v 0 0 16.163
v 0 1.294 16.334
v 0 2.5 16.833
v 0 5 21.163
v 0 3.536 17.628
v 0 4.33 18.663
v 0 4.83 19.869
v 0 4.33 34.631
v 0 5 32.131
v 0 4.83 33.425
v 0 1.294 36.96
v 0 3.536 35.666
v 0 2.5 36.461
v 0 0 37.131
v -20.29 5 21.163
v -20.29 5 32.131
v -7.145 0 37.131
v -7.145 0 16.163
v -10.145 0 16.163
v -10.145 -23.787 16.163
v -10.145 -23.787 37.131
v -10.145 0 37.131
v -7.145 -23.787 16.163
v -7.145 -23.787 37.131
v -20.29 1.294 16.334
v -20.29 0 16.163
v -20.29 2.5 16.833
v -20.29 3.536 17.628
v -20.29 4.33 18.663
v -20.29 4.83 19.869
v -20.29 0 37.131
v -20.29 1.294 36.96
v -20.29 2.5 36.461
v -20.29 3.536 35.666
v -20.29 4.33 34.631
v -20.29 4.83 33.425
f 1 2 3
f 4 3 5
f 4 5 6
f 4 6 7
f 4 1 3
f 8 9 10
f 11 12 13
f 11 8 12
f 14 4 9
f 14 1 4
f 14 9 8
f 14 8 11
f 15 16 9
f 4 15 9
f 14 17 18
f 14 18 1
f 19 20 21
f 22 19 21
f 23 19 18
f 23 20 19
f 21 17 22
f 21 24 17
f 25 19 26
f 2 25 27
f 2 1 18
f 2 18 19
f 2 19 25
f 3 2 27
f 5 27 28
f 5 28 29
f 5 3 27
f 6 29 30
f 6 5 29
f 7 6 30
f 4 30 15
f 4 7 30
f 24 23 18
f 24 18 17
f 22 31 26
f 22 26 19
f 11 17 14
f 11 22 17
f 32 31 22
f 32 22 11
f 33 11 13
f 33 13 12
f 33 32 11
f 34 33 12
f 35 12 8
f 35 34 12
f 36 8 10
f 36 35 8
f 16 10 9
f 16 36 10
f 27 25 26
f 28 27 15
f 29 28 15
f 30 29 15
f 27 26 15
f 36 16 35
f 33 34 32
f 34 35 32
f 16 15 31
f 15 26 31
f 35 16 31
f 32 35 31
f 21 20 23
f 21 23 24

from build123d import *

# Parameters (mm, degrees)
F1_E1_RIGHT_W = 20.9673028439
F1_E1_RIGHT_H = 23.7872338621
F2_DEPTH      = 3
F0_W          = 10.1448968053
F0_H          = 20.9673028439
F3_DEPTH      = 5
F4_R          = 5
F5_R          = 5


with BuildPart() as f2:
    # F1_E1_right (on explicit) → F2 (new body)
    with BuildSketch(Plane(origin=(-10.1448968053, 0, 16.1632616073), x_dir=(0, 0, 1), z_dir=(1, 0, 0))):
        with Locations((10.483651422, 11.893616931)):
            Rectangle(F1_E1_RIGHT_W, F1_E1_RIGHT_H)
    extrude(amount=F2_DEPTH)

    # F0 (on Front) → F3 (join)
    with BuildSketch(Plane.XZ):
        with Locations((-5.0724484026, 26.6469130293)):
            Rectangle(F0_W, F0_H)
        with Locations((-15.2173452079, 26.6469130293)):
            Rectangle(F0_W, F0_H)
    extrude(amount=-F3_DEPTH)

    # F4
    f4_edges = [f2.edges().sort_by_distance(p)[0] for p in [
        (-10.144897, 5, 37.130564),
    ]]
    fillet(f4_edges, radius=F4_R)

    # F5
    f5_edges = [f2.edges().sort_by_distance(p)[0] for p in [
        (-10.144897, 5, 16.163262),
    ]]
    fillet(f5_edges, radius=F5_R)


solid = f2.part
